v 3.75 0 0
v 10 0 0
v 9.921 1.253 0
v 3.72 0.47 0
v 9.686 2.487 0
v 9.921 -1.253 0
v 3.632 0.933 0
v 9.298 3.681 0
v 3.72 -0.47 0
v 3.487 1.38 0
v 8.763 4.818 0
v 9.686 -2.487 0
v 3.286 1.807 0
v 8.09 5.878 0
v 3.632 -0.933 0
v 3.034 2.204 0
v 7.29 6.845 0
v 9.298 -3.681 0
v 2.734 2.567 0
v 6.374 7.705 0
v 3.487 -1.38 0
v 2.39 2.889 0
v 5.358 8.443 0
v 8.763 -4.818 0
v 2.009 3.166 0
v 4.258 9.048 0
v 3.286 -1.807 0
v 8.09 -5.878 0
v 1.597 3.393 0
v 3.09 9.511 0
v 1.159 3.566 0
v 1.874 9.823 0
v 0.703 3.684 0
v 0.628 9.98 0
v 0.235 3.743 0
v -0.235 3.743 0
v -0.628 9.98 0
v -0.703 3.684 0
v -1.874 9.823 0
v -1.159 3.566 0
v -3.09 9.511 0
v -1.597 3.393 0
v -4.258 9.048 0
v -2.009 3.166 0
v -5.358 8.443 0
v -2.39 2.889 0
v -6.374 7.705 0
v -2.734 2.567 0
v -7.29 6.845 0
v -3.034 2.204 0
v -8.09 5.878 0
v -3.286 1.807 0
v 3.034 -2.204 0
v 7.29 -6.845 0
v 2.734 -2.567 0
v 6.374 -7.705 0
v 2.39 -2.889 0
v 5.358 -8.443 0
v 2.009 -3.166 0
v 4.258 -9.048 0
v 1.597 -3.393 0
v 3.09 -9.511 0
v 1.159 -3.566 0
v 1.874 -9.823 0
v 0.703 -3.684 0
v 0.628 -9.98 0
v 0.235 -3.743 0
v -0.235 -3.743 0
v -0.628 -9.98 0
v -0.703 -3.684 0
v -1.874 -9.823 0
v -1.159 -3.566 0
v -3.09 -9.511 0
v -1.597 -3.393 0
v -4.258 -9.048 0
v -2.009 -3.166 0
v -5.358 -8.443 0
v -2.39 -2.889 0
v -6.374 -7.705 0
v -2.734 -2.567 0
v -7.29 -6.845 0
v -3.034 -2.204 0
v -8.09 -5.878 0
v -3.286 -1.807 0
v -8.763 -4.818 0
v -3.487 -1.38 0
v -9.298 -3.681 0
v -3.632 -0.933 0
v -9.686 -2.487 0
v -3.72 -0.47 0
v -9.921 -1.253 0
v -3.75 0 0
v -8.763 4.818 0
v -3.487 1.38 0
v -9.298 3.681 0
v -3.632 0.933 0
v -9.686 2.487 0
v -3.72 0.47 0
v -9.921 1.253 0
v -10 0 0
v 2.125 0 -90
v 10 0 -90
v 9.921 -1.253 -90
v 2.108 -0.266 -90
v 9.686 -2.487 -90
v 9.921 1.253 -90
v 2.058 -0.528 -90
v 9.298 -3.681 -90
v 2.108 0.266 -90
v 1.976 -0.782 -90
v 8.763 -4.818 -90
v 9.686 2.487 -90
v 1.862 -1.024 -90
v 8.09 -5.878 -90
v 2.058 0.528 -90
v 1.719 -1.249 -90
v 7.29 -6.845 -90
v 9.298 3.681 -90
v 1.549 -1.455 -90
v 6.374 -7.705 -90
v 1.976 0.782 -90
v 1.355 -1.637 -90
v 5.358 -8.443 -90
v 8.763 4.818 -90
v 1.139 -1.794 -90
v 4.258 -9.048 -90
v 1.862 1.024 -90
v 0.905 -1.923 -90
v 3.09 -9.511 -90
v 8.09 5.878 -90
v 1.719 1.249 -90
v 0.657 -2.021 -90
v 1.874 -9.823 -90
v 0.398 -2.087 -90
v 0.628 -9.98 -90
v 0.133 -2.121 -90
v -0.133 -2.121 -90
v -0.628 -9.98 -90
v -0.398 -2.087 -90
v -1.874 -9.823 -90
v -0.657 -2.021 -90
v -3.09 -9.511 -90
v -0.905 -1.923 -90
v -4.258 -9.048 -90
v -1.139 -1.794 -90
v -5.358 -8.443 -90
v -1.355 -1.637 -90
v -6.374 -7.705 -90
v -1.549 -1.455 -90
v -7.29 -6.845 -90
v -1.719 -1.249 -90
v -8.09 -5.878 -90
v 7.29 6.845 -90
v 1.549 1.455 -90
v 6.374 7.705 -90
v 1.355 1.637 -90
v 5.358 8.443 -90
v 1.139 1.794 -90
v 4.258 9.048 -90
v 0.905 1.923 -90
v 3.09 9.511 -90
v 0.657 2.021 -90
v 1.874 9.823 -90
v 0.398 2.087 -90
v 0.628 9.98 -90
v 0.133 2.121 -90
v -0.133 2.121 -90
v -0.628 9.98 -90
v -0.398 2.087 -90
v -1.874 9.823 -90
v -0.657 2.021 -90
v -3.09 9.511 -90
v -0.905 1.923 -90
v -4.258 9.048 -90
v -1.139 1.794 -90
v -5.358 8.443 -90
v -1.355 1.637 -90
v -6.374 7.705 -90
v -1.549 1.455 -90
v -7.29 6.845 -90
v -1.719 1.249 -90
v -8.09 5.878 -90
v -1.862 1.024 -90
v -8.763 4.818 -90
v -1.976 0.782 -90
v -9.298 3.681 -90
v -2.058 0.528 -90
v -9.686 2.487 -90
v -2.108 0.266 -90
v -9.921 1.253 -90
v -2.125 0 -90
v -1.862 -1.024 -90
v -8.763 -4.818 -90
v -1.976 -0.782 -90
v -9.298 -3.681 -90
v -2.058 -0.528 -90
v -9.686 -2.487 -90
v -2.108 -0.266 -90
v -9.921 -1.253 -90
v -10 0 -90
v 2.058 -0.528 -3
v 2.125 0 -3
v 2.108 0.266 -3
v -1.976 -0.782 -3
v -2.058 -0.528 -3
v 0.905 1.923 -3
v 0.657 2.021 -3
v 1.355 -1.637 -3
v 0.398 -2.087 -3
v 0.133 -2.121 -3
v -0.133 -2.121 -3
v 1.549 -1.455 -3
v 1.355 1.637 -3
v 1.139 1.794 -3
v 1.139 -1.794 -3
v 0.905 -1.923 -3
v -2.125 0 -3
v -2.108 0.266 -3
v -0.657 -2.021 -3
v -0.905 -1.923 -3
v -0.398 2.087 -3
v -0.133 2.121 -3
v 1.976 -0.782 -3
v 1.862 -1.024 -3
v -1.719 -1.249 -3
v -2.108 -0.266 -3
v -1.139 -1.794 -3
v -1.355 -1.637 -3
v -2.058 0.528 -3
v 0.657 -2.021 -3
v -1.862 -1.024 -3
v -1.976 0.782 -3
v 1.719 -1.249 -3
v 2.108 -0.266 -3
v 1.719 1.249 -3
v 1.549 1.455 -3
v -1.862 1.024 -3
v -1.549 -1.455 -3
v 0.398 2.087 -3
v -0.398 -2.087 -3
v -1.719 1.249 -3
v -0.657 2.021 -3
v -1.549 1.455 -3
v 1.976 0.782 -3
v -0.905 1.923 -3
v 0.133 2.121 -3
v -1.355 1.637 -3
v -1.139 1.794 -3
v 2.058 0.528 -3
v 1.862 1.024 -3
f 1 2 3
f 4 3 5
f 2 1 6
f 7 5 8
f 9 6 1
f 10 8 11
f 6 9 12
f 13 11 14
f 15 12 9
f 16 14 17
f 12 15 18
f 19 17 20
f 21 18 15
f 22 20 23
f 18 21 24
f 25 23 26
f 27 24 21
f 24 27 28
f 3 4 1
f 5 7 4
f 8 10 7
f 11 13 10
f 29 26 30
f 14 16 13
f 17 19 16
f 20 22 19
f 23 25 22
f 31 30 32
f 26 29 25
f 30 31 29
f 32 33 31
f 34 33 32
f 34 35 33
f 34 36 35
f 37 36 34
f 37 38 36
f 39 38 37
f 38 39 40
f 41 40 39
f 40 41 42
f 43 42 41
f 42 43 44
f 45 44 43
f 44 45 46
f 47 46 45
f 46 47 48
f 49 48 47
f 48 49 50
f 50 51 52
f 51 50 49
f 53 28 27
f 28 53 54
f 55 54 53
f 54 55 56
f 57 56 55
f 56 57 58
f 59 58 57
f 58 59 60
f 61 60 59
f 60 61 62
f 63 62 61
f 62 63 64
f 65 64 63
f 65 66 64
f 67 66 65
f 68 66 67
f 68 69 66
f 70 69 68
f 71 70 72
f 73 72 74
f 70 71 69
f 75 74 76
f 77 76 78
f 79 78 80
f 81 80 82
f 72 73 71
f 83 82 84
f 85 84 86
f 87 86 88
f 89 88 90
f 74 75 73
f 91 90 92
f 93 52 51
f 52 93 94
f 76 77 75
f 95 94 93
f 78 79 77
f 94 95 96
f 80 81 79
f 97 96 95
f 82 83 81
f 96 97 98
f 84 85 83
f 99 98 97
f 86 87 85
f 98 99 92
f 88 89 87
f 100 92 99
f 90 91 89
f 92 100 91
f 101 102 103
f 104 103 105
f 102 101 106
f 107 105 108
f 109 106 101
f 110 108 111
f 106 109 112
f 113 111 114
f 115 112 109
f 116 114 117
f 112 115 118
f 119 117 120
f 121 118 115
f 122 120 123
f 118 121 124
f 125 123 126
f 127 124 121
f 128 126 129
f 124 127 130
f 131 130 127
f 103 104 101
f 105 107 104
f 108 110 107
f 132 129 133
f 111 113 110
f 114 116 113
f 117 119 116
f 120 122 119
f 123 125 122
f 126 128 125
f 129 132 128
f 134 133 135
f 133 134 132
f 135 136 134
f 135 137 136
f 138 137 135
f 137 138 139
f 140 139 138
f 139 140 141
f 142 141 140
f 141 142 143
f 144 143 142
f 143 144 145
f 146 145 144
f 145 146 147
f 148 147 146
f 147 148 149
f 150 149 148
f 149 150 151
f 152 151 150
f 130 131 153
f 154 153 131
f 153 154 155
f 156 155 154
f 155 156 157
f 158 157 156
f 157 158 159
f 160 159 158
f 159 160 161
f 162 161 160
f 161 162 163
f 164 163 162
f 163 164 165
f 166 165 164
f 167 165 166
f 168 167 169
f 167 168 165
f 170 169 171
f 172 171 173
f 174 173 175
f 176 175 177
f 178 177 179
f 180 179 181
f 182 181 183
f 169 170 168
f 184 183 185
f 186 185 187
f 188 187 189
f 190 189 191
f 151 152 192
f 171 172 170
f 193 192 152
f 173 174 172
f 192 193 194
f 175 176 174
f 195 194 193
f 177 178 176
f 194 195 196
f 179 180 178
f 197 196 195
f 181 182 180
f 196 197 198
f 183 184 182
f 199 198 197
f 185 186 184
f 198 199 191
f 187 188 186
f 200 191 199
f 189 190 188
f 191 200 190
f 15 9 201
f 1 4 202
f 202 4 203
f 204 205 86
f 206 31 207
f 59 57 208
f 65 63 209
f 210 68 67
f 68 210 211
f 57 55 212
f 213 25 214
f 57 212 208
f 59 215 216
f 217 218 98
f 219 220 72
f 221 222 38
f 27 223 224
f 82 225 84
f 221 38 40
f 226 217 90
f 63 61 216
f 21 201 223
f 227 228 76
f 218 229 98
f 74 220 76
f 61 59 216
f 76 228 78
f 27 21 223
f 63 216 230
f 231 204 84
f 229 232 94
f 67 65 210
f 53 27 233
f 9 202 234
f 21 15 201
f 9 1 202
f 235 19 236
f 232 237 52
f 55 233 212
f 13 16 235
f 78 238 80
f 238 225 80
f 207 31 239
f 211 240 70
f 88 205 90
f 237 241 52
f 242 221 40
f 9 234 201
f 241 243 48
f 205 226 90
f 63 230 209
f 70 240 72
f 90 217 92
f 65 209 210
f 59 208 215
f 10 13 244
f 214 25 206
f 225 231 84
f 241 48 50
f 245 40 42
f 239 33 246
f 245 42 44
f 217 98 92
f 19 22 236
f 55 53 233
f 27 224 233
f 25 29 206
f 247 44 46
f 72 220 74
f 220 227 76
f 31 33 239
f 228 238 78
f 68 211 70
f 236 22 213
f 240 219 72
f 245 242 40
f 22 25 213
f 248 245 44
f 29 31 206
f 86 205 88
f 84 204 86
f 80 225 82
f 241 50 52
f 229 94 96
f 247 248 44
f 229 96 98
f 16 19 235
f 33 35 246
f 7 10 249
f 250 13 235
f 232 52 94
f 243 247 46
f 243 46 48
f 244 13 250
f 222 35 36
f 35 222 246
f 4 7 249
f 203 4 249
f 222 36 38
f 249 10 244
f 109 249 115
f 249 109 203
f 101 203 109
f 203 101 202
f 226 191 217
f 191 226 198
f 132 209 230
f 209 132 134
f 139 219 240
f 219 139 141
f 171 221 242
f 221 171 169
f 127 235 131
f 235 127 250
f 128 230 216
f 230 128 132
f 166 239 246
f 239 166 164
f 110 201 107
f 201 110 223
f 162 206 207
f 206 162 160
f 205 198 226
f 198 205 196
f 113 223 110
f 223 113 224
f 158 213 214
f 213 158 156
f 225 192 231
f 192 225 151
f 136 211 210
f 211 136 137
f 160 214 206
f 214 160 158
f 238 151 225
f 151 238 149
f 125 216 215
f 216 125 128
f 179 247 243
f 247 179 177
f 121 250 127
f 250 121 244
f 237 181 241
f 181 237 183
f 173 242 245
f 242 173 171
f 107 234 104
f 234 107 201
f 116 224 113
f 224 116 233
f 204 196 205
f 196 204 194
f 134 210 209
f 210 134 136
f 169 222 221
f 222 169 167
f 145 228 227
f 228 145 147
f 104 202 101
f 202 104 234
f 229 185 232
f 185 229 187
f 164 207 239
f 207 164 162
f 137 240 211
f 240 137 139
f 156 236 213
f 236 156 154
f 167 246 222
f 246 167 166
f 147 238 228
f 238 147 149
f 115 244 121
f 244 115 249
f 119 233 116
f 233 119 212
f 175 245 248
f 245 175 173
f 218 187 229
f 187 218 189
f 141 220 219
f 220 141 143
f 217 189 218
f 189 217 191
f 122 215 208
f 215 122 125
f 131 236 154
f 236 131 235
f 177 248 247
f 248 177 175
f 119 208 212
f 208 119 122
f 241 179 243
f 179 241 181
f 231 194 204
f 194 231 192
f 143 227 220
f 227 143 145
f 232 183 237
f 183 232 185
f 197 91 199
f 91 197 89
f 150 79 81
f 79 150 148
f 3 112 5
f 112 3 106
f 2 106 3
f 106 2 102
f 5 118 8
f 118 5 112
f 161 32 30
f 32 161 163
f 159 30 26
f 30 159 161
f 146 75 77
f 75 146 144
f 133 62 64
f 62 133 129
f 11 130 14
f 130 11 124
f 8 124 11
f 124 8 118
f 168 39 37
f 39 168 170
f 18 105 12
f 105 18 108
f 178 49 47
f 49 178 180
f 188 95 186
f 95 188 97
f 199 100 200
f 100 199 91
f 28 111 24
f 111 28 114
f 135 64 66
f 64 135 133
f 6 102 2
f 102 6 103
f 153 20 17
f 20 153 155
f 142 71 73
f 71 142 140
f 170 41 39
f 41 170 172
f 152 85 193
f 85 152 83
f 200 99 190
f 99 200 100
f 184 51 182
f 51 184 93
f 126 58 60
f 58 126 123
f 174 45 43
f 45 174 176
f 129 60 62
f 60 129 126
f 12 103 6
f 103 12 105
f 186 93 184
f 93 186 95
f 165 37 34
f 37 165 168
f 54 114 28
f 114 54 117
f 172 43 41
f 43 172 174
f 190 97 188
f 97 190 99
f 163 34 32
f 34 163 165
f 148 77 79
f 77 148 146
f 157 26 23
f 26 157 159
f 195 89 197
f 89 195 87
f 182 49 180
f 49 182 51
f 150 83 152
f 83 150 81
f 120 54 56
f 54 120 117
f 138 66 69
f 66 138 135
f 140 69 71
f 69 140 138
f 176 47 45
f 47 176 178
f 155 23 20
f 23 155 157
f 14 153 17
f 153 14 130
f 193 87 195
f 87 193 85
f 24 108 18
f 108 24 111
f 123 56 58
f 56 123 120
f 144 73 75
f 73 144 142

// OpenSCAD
$fn = 50;


difference() {
	union() {
		translate(v = [0, 0, -90.0000000000]) {
			cylinder(h = 90, r = 10.0000000000);
		}
	}
	union() {
		translate(v = [0, 0, 0]) {
			rotate(a = [0, 0, 0]) {
				difference() {
					union() {
						#translate(v = [0, 0, -90.0000000000]) {
							cylinder(h = 90, r = 2.0000000000);
						}
						#translate(v = [0, 0, -3]) {
							cylinder(h = 3, r = 10.0000000000, r1 = 2.1250000000, r2 = 3.7500000000);
						}
						#translate(v = [0, 0, -90.0000000000]) {
							cylinder(h = 90, r = 2.1250000000);
						}
						#translate(v = [0, 0, -90.0000000000]) {
							cylinder(h = 90, r = 2.0000000000);
						}
					}
					union();
				}
			}
		}
	}
}
